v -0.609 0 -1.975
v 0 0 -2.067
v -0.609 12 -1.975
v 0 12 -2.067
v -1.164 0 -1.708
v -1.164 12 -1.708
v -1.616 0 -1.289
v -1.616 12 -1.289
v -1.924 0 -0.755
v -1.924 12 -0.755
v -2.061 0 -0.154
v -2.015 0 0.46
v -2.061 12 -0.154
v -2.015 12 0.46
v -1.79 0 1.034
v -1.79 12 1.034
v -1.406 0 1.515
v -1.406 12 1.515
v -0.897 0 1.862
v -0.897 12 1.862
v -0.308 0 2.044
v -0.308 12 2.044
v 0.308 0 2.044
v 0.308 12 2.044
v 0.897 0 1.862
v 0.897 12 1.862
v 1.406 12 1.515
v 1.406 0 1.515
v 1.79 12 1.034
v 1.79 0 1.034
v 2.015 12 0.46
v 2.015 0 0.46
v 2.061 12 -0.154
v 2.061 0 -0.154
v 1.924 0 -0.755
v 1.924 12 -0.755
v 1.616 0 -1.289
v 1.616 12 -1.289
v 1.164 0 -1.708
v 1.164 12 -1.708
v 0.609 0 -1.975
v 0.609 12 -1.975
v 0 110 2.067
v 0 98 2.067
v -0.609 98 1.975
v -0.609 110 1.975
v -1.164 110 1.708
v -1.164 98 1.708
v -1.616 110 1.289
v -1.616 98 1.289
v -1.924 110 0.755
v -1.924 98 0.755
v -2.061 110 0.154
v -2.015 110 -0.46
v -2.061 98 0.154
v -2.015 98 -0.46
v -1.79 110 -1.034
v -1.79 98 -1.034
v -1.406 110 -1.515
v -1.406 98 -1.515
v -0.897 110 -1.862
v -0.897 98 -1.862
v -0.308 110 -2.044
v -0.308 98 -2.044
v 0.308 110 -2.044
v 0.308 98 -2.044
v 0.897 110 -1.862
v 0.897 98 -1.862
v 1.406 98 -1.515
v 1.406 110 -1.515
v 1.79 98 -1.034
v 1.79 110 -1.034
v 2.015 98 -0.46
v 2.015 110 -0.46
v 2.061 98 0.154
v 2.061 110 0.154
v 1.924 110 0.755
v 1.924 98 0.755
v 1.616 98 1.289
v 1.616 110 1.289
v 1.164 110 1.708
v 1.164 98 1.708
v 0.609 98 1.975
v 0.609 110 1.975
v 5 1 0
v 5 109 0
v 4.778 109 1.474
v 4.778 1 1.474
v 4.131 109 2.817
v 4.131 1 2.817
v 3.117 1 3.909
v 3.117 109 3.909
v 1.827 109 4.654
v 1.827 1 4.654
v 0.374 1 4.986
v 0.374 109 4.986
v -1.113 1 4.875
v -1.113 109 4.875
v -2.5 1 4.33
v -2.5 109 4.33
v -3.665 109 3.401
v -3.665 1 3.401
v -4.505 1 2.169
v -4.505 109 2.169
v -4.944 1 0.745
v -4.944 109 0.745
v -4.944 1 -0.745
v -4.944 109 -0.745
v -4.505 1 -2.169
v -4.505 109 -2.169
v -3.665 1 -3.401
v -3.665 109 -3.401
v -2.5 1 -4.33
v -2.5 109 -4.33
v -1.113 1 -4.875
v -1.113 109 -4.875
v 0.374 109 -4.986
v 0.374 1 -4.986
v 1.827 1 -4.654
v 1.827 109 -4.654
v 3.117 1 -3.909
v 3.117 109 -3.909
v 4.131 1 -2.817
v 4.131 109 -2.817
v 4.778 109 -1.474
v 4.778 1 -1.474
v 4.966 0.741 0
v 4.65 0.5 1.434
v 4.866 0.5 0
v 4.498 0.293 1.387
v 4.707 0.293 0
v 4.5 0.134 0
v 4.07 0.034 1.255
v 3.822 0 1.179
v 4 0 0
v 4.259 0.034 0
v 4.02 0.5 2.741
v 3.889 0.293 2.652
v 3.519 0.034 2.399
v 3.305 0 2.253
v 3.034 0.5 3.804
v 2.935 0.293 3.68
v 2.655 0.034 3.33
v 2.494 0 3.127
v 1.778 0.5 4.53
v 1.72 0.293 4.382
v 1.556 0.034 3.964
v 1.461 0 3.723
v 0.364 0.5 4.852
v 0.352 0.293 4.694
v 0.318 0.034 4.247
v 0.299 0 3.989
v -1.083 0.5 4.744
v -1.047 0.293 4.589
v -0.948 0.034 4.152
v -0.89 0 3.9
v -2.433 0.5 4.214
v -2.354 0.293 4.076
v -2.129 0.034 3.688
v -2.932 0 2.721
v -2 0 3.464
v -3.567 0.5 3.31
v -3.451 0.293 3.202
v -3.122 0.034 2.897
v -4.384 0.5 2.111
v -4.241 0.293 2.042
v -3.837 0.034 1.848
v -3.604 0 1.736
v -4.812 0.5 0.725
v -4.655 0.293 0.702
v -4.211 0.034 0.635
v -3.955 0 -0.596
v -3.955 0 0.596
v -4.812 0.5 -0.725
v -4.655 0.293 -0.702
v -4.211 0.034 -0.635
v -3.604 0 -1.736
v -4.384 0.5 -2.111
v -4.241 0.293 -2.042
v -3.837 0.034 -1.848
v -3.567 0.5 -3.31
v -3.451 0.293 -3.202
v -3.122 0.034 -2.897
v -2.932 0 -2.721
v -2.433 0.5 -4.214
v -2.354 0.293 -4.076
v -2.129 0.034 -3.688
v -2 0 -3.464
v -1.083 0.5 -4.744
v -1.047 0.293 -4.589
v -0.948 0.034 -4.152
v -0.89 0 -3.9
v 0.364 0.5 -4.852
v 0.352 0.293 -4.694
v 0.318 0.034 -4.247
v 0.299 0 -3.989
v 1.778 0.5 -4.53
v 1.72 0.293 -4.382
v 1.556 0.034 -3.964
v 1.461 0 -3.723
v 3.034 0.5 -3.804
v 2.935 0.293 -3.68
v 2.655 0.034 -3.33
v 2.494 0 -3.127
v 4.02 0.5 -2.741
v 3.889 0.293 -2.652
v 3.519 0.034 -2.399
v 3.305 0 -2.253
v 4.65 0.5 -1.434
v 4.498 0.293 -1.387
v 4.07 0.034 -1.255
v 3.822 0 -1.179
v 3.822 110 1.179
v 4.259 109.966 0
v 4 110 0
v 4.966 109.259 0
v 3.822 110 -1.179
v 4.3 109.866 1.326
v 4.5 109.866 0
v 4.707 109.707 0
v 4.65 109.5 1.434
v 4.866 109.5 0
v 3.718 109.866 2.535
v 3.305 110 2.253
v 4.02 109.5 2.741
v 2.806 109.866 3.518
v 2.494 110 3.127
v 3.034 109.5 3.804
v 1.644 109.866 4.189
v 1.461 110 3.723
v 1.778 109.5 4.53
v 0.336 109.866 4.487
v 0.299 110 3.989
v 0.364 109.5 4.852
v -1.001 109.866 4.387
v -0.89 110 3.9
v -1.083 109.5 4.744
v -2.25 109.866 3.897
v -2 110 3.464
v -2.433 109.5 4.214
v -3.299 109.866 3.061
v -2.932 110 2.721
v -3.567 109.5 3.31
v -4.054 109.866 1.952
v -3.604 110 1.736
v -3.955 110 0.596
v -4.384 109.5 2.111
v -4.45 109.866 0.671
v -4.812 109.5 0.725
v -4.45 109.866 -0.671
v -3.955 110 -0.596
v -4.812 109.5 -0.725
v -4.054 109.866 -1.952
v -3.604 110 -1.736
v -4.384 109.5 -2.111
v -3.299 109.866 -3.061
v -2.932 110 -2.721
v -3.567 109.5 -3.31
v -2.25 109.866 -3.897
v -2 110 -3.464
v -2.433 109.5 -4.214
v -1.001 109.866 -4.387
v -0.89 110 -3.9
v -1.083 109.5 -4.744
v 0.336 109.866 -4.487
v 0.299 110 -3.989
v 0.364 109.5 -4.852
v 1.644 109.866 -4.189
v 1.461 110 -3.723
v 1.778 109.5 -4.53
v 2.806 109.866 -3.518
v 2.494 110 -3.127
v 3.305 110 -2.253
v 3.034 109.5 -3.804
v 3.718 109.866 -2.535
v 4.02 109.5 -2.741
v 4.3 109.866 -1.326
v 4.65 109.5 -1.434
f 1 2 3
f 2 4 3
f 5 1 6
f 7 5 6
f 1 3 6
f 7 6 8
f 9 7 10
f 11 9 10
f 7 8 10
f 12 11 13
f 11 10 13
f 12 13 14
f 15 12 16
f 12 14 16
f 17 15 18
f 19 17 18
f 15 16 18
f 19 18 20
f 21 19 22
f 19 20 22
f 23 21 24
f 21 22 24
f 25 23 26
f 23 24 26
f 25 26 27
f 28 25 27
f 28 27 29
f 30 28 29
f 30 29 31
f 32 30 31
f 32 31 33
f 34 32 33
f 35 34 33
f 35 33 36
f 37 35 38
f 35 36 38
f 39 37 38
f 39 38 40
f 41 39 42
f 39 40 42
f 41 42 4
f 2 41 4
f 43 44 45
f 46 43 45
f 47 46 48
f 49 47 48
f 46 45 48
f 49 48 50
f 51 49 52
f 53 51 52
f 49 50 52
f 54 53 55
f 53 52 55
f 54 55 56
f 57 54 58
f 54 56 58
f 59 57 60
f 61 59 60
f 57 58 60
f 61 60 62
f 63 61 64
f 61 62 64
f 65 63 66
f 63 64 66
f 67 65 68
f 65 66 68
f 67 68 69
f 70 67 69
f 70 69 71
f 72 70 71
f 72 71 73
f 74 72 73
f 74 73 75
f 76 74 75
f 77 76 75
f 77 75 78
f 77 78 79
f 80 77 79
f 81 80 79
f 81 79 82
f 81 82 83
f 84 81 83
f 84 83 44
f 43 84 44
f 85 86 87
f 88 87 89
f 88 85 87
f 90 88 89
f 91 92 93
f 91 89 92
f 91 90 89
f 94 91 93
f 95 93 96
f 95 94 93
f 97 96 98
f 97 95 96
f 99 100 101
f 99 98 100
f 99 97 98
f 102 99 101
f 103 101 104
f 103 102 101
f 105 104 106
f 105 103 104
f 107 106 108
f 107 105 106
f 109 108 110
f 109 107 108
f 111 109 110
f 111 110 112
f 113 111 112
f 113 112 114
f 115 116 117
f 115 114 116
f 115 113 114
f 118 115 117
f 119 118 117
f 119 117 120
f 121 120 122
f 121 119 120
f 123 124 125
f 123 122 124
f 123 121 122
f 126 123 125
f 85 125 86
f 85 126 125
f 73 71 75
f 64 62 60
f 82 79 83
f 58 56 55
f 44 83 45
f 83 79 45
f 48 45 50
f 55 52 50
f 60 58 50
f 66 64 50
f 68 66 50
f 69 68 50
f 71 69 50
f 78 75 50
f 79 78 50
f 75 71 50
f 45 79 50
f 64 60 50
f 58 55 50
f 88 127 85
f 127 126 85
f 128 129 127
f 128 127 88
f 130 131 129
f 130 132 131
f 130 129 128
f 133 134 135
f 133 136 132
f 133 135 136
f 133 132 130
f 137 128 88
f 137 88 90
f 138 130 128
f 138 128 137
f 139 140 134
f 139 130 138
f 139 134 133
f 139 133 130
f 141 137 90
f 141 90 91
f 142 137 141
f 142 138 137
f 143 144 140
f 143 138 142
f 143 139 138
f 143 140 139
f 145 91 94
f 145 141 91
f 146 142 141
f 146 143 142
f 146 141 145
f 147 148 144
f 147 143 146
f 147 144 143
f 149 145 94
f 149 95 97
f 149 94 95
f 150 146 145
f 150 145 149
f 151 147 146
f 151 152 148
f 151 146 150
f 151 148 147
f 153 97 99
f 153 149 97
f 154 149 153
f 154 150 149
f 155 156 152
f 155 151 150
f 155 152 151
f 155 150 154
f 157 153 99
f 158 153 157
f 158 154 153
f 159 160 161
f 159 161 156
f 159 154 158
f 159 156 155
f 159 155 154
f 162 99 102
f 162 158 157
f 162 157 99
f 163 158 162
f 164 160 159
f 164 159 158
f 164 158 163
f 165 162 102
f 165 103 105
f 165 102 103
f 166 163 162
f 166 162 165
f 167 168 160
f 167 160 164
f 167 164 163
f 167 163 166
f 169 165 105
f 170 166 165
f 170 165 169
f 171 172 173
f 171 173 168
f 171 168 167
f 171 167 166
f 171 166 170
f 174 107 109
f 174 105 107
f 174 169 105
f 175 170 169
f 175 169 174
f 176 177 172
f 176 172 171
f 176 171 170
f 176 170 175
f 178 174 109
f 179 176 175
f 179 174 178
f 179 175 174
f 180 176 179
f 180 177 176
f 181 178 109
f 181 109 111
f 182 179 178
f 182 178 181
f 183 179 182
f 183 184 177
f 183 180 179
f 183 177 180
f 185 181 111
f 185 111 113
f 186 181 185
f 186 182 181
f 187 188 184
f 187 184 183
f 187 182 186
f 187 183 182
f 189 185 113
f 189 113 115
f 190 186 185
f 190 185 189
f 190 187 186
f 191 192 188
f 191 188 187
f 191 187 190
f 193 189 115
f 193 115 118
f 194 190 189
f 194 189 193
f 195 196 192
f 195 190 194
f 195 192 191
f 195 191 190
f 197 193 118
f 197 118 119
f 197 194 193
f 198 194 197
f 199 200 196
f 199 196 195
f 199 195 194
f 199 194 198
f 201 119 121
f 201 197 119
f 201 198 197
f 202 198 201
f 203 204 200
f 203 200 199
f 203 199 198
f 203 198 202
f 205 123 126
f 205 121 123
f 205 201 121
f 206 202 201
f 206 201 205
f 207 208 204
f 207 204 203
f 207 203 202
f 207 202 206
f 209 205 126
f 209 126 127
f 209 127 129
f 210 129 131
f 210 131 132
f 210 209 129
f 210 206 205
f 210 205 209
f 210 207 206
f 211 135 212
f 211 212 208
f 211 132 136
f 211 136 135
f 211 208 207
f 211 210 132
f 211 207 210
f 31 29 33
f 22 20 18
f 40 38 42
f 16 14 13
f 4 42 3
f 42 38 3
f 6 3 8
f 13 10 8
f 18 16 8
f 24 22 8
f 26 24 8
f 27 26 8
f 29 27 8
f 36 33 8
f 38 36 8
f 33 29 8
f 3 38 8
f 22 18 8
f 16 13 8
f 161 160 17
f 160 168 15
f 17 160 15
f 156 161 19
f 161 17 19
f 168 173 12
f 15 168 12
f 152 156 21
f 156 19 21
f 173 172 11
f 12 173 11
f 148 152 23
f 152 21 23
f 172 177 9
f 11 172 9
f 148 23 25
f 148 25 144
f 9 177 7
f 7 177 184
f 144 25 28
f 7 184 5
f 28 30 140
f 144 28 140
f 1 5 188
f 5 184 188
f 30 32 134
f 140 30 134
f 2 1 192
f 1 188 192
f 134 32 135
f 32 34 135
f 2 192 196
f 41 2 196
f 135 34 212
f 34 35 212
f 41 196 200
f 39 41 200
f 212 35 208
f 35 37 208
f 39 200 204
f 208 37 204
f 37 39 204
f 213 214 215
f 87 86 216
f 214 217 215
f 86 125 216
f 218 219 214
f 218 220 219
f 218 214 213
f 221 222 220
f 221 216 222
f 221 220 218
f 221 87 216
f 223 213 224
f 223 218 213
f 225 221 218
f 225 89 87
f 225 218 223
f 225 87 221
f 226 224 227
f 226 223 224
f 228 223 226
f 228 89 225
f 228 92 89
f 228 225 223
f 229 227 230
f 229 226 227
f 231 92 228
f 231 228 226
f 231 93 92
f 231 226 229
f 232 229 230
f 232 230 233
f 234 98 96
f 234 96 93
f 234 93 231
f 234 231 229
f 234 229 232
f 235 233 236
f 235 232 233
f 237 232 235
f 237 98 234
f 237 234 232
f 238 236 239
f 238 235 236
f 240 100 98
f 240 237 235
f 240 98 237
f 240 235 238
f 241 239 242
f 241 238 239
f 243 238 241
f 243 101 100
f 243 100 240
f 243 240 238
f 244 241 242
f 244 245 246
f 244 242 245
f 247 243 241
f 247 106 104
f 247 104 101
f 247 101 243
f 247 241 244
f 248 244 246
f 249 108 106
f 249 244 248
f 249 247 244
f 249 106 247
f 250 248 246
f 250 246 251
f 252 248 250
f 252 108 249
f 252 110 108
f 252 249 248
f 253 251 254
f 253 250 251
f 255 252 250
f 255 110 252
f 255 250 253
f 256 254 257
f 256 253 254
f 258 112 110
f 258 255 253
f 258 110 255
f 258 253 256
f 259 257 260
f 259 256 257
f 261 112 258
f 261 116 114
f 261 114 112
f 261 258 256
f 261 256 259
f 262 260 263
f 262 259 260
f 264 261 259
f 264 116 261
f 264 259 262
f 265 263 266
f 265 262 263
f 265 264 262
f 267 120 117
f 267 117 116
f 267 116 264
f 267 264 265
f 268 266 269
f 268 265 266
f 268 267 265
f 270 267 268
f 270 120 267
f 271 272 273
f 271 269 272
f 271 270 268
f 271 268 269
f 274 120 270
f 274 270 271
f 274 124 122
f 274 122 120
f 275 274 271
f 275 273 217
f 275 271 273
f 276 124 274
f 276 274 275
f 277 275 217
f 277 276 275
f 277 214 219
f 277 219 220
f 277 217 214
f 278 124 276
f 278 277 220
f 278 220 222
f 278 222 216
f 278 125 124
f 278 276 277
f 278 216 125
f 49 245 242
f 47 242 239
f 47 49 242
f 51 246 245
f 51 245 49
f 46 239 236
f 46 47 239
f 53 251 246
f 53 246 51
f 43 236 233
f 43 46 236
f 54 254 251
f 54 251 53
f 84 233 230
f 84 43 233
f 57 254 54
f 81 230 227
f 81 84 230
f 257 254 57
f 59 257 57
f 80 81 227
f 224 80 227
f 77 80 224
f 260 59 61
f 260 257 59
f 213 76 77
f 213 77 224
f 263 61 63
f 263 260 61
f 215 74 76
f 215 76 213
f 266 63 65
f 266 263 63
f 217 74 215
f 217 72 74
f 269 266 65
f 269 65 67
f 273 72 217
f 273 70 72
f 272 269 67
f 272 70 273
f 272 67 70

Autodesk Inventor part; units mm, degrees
ref_plane "YZ Plane" through (0, 0, 0) normal (1, 0, 0) x (0, 1, 0)
ref_plane "XZ Plane" through (0, 0, 0) normal (0, 1, 0) x (-1, 0, 0)
ref_plane "XY Plane" through (0, 0, 0) normal (0, 0, 1) x (1, 0, 0)
sketch "Sketch1" plane through (0, 0, 0) normal (0, 0, 1) x (1, 0, 0)
  line L0 (0, 0) -> (0, 110)
  line L1 (0, 110) -> (5, 110)
  line L2 (5, 110) -> (5, 0)
  line L3 (5, 0) -> (0, 0)
  dimension "d0" = 110
  dimension "d1" = 10
revolve "Revolution1" add sketch "Sketch1" angle 360 about axis through (0, 0, 0) along (0, 1, 0)
fillet "Fillet1" radius 1 2 edges at (-5, 0, 0) (-5, 110, 0)
sketch "Sketch2" plane through (0, 110, 0) normal (0, 1, 0) x (1, 0, 0)
  circle A0 centre (0, 0) radius 5 projected
hole "Hole1" at (0, 110, 0) direction (0, -1, 0) diameter 4.134 depth 12 thread size "M5x0.8" class "6H" standard "ISO Metric profile"
sketch "Sketch3" plane through (0, 0, 0) normal (0, -1, 0) x (1, 0, 0)
  circle A0 centre (0, 0) radius 5 projected
hole "Hole2" at (0, 0, 0) direction (0, 1, 0) diameter 4.134 depth 12 thread size "M5x0.8" class "6H" standard "ISO Metric profile"
properties part number "121"
